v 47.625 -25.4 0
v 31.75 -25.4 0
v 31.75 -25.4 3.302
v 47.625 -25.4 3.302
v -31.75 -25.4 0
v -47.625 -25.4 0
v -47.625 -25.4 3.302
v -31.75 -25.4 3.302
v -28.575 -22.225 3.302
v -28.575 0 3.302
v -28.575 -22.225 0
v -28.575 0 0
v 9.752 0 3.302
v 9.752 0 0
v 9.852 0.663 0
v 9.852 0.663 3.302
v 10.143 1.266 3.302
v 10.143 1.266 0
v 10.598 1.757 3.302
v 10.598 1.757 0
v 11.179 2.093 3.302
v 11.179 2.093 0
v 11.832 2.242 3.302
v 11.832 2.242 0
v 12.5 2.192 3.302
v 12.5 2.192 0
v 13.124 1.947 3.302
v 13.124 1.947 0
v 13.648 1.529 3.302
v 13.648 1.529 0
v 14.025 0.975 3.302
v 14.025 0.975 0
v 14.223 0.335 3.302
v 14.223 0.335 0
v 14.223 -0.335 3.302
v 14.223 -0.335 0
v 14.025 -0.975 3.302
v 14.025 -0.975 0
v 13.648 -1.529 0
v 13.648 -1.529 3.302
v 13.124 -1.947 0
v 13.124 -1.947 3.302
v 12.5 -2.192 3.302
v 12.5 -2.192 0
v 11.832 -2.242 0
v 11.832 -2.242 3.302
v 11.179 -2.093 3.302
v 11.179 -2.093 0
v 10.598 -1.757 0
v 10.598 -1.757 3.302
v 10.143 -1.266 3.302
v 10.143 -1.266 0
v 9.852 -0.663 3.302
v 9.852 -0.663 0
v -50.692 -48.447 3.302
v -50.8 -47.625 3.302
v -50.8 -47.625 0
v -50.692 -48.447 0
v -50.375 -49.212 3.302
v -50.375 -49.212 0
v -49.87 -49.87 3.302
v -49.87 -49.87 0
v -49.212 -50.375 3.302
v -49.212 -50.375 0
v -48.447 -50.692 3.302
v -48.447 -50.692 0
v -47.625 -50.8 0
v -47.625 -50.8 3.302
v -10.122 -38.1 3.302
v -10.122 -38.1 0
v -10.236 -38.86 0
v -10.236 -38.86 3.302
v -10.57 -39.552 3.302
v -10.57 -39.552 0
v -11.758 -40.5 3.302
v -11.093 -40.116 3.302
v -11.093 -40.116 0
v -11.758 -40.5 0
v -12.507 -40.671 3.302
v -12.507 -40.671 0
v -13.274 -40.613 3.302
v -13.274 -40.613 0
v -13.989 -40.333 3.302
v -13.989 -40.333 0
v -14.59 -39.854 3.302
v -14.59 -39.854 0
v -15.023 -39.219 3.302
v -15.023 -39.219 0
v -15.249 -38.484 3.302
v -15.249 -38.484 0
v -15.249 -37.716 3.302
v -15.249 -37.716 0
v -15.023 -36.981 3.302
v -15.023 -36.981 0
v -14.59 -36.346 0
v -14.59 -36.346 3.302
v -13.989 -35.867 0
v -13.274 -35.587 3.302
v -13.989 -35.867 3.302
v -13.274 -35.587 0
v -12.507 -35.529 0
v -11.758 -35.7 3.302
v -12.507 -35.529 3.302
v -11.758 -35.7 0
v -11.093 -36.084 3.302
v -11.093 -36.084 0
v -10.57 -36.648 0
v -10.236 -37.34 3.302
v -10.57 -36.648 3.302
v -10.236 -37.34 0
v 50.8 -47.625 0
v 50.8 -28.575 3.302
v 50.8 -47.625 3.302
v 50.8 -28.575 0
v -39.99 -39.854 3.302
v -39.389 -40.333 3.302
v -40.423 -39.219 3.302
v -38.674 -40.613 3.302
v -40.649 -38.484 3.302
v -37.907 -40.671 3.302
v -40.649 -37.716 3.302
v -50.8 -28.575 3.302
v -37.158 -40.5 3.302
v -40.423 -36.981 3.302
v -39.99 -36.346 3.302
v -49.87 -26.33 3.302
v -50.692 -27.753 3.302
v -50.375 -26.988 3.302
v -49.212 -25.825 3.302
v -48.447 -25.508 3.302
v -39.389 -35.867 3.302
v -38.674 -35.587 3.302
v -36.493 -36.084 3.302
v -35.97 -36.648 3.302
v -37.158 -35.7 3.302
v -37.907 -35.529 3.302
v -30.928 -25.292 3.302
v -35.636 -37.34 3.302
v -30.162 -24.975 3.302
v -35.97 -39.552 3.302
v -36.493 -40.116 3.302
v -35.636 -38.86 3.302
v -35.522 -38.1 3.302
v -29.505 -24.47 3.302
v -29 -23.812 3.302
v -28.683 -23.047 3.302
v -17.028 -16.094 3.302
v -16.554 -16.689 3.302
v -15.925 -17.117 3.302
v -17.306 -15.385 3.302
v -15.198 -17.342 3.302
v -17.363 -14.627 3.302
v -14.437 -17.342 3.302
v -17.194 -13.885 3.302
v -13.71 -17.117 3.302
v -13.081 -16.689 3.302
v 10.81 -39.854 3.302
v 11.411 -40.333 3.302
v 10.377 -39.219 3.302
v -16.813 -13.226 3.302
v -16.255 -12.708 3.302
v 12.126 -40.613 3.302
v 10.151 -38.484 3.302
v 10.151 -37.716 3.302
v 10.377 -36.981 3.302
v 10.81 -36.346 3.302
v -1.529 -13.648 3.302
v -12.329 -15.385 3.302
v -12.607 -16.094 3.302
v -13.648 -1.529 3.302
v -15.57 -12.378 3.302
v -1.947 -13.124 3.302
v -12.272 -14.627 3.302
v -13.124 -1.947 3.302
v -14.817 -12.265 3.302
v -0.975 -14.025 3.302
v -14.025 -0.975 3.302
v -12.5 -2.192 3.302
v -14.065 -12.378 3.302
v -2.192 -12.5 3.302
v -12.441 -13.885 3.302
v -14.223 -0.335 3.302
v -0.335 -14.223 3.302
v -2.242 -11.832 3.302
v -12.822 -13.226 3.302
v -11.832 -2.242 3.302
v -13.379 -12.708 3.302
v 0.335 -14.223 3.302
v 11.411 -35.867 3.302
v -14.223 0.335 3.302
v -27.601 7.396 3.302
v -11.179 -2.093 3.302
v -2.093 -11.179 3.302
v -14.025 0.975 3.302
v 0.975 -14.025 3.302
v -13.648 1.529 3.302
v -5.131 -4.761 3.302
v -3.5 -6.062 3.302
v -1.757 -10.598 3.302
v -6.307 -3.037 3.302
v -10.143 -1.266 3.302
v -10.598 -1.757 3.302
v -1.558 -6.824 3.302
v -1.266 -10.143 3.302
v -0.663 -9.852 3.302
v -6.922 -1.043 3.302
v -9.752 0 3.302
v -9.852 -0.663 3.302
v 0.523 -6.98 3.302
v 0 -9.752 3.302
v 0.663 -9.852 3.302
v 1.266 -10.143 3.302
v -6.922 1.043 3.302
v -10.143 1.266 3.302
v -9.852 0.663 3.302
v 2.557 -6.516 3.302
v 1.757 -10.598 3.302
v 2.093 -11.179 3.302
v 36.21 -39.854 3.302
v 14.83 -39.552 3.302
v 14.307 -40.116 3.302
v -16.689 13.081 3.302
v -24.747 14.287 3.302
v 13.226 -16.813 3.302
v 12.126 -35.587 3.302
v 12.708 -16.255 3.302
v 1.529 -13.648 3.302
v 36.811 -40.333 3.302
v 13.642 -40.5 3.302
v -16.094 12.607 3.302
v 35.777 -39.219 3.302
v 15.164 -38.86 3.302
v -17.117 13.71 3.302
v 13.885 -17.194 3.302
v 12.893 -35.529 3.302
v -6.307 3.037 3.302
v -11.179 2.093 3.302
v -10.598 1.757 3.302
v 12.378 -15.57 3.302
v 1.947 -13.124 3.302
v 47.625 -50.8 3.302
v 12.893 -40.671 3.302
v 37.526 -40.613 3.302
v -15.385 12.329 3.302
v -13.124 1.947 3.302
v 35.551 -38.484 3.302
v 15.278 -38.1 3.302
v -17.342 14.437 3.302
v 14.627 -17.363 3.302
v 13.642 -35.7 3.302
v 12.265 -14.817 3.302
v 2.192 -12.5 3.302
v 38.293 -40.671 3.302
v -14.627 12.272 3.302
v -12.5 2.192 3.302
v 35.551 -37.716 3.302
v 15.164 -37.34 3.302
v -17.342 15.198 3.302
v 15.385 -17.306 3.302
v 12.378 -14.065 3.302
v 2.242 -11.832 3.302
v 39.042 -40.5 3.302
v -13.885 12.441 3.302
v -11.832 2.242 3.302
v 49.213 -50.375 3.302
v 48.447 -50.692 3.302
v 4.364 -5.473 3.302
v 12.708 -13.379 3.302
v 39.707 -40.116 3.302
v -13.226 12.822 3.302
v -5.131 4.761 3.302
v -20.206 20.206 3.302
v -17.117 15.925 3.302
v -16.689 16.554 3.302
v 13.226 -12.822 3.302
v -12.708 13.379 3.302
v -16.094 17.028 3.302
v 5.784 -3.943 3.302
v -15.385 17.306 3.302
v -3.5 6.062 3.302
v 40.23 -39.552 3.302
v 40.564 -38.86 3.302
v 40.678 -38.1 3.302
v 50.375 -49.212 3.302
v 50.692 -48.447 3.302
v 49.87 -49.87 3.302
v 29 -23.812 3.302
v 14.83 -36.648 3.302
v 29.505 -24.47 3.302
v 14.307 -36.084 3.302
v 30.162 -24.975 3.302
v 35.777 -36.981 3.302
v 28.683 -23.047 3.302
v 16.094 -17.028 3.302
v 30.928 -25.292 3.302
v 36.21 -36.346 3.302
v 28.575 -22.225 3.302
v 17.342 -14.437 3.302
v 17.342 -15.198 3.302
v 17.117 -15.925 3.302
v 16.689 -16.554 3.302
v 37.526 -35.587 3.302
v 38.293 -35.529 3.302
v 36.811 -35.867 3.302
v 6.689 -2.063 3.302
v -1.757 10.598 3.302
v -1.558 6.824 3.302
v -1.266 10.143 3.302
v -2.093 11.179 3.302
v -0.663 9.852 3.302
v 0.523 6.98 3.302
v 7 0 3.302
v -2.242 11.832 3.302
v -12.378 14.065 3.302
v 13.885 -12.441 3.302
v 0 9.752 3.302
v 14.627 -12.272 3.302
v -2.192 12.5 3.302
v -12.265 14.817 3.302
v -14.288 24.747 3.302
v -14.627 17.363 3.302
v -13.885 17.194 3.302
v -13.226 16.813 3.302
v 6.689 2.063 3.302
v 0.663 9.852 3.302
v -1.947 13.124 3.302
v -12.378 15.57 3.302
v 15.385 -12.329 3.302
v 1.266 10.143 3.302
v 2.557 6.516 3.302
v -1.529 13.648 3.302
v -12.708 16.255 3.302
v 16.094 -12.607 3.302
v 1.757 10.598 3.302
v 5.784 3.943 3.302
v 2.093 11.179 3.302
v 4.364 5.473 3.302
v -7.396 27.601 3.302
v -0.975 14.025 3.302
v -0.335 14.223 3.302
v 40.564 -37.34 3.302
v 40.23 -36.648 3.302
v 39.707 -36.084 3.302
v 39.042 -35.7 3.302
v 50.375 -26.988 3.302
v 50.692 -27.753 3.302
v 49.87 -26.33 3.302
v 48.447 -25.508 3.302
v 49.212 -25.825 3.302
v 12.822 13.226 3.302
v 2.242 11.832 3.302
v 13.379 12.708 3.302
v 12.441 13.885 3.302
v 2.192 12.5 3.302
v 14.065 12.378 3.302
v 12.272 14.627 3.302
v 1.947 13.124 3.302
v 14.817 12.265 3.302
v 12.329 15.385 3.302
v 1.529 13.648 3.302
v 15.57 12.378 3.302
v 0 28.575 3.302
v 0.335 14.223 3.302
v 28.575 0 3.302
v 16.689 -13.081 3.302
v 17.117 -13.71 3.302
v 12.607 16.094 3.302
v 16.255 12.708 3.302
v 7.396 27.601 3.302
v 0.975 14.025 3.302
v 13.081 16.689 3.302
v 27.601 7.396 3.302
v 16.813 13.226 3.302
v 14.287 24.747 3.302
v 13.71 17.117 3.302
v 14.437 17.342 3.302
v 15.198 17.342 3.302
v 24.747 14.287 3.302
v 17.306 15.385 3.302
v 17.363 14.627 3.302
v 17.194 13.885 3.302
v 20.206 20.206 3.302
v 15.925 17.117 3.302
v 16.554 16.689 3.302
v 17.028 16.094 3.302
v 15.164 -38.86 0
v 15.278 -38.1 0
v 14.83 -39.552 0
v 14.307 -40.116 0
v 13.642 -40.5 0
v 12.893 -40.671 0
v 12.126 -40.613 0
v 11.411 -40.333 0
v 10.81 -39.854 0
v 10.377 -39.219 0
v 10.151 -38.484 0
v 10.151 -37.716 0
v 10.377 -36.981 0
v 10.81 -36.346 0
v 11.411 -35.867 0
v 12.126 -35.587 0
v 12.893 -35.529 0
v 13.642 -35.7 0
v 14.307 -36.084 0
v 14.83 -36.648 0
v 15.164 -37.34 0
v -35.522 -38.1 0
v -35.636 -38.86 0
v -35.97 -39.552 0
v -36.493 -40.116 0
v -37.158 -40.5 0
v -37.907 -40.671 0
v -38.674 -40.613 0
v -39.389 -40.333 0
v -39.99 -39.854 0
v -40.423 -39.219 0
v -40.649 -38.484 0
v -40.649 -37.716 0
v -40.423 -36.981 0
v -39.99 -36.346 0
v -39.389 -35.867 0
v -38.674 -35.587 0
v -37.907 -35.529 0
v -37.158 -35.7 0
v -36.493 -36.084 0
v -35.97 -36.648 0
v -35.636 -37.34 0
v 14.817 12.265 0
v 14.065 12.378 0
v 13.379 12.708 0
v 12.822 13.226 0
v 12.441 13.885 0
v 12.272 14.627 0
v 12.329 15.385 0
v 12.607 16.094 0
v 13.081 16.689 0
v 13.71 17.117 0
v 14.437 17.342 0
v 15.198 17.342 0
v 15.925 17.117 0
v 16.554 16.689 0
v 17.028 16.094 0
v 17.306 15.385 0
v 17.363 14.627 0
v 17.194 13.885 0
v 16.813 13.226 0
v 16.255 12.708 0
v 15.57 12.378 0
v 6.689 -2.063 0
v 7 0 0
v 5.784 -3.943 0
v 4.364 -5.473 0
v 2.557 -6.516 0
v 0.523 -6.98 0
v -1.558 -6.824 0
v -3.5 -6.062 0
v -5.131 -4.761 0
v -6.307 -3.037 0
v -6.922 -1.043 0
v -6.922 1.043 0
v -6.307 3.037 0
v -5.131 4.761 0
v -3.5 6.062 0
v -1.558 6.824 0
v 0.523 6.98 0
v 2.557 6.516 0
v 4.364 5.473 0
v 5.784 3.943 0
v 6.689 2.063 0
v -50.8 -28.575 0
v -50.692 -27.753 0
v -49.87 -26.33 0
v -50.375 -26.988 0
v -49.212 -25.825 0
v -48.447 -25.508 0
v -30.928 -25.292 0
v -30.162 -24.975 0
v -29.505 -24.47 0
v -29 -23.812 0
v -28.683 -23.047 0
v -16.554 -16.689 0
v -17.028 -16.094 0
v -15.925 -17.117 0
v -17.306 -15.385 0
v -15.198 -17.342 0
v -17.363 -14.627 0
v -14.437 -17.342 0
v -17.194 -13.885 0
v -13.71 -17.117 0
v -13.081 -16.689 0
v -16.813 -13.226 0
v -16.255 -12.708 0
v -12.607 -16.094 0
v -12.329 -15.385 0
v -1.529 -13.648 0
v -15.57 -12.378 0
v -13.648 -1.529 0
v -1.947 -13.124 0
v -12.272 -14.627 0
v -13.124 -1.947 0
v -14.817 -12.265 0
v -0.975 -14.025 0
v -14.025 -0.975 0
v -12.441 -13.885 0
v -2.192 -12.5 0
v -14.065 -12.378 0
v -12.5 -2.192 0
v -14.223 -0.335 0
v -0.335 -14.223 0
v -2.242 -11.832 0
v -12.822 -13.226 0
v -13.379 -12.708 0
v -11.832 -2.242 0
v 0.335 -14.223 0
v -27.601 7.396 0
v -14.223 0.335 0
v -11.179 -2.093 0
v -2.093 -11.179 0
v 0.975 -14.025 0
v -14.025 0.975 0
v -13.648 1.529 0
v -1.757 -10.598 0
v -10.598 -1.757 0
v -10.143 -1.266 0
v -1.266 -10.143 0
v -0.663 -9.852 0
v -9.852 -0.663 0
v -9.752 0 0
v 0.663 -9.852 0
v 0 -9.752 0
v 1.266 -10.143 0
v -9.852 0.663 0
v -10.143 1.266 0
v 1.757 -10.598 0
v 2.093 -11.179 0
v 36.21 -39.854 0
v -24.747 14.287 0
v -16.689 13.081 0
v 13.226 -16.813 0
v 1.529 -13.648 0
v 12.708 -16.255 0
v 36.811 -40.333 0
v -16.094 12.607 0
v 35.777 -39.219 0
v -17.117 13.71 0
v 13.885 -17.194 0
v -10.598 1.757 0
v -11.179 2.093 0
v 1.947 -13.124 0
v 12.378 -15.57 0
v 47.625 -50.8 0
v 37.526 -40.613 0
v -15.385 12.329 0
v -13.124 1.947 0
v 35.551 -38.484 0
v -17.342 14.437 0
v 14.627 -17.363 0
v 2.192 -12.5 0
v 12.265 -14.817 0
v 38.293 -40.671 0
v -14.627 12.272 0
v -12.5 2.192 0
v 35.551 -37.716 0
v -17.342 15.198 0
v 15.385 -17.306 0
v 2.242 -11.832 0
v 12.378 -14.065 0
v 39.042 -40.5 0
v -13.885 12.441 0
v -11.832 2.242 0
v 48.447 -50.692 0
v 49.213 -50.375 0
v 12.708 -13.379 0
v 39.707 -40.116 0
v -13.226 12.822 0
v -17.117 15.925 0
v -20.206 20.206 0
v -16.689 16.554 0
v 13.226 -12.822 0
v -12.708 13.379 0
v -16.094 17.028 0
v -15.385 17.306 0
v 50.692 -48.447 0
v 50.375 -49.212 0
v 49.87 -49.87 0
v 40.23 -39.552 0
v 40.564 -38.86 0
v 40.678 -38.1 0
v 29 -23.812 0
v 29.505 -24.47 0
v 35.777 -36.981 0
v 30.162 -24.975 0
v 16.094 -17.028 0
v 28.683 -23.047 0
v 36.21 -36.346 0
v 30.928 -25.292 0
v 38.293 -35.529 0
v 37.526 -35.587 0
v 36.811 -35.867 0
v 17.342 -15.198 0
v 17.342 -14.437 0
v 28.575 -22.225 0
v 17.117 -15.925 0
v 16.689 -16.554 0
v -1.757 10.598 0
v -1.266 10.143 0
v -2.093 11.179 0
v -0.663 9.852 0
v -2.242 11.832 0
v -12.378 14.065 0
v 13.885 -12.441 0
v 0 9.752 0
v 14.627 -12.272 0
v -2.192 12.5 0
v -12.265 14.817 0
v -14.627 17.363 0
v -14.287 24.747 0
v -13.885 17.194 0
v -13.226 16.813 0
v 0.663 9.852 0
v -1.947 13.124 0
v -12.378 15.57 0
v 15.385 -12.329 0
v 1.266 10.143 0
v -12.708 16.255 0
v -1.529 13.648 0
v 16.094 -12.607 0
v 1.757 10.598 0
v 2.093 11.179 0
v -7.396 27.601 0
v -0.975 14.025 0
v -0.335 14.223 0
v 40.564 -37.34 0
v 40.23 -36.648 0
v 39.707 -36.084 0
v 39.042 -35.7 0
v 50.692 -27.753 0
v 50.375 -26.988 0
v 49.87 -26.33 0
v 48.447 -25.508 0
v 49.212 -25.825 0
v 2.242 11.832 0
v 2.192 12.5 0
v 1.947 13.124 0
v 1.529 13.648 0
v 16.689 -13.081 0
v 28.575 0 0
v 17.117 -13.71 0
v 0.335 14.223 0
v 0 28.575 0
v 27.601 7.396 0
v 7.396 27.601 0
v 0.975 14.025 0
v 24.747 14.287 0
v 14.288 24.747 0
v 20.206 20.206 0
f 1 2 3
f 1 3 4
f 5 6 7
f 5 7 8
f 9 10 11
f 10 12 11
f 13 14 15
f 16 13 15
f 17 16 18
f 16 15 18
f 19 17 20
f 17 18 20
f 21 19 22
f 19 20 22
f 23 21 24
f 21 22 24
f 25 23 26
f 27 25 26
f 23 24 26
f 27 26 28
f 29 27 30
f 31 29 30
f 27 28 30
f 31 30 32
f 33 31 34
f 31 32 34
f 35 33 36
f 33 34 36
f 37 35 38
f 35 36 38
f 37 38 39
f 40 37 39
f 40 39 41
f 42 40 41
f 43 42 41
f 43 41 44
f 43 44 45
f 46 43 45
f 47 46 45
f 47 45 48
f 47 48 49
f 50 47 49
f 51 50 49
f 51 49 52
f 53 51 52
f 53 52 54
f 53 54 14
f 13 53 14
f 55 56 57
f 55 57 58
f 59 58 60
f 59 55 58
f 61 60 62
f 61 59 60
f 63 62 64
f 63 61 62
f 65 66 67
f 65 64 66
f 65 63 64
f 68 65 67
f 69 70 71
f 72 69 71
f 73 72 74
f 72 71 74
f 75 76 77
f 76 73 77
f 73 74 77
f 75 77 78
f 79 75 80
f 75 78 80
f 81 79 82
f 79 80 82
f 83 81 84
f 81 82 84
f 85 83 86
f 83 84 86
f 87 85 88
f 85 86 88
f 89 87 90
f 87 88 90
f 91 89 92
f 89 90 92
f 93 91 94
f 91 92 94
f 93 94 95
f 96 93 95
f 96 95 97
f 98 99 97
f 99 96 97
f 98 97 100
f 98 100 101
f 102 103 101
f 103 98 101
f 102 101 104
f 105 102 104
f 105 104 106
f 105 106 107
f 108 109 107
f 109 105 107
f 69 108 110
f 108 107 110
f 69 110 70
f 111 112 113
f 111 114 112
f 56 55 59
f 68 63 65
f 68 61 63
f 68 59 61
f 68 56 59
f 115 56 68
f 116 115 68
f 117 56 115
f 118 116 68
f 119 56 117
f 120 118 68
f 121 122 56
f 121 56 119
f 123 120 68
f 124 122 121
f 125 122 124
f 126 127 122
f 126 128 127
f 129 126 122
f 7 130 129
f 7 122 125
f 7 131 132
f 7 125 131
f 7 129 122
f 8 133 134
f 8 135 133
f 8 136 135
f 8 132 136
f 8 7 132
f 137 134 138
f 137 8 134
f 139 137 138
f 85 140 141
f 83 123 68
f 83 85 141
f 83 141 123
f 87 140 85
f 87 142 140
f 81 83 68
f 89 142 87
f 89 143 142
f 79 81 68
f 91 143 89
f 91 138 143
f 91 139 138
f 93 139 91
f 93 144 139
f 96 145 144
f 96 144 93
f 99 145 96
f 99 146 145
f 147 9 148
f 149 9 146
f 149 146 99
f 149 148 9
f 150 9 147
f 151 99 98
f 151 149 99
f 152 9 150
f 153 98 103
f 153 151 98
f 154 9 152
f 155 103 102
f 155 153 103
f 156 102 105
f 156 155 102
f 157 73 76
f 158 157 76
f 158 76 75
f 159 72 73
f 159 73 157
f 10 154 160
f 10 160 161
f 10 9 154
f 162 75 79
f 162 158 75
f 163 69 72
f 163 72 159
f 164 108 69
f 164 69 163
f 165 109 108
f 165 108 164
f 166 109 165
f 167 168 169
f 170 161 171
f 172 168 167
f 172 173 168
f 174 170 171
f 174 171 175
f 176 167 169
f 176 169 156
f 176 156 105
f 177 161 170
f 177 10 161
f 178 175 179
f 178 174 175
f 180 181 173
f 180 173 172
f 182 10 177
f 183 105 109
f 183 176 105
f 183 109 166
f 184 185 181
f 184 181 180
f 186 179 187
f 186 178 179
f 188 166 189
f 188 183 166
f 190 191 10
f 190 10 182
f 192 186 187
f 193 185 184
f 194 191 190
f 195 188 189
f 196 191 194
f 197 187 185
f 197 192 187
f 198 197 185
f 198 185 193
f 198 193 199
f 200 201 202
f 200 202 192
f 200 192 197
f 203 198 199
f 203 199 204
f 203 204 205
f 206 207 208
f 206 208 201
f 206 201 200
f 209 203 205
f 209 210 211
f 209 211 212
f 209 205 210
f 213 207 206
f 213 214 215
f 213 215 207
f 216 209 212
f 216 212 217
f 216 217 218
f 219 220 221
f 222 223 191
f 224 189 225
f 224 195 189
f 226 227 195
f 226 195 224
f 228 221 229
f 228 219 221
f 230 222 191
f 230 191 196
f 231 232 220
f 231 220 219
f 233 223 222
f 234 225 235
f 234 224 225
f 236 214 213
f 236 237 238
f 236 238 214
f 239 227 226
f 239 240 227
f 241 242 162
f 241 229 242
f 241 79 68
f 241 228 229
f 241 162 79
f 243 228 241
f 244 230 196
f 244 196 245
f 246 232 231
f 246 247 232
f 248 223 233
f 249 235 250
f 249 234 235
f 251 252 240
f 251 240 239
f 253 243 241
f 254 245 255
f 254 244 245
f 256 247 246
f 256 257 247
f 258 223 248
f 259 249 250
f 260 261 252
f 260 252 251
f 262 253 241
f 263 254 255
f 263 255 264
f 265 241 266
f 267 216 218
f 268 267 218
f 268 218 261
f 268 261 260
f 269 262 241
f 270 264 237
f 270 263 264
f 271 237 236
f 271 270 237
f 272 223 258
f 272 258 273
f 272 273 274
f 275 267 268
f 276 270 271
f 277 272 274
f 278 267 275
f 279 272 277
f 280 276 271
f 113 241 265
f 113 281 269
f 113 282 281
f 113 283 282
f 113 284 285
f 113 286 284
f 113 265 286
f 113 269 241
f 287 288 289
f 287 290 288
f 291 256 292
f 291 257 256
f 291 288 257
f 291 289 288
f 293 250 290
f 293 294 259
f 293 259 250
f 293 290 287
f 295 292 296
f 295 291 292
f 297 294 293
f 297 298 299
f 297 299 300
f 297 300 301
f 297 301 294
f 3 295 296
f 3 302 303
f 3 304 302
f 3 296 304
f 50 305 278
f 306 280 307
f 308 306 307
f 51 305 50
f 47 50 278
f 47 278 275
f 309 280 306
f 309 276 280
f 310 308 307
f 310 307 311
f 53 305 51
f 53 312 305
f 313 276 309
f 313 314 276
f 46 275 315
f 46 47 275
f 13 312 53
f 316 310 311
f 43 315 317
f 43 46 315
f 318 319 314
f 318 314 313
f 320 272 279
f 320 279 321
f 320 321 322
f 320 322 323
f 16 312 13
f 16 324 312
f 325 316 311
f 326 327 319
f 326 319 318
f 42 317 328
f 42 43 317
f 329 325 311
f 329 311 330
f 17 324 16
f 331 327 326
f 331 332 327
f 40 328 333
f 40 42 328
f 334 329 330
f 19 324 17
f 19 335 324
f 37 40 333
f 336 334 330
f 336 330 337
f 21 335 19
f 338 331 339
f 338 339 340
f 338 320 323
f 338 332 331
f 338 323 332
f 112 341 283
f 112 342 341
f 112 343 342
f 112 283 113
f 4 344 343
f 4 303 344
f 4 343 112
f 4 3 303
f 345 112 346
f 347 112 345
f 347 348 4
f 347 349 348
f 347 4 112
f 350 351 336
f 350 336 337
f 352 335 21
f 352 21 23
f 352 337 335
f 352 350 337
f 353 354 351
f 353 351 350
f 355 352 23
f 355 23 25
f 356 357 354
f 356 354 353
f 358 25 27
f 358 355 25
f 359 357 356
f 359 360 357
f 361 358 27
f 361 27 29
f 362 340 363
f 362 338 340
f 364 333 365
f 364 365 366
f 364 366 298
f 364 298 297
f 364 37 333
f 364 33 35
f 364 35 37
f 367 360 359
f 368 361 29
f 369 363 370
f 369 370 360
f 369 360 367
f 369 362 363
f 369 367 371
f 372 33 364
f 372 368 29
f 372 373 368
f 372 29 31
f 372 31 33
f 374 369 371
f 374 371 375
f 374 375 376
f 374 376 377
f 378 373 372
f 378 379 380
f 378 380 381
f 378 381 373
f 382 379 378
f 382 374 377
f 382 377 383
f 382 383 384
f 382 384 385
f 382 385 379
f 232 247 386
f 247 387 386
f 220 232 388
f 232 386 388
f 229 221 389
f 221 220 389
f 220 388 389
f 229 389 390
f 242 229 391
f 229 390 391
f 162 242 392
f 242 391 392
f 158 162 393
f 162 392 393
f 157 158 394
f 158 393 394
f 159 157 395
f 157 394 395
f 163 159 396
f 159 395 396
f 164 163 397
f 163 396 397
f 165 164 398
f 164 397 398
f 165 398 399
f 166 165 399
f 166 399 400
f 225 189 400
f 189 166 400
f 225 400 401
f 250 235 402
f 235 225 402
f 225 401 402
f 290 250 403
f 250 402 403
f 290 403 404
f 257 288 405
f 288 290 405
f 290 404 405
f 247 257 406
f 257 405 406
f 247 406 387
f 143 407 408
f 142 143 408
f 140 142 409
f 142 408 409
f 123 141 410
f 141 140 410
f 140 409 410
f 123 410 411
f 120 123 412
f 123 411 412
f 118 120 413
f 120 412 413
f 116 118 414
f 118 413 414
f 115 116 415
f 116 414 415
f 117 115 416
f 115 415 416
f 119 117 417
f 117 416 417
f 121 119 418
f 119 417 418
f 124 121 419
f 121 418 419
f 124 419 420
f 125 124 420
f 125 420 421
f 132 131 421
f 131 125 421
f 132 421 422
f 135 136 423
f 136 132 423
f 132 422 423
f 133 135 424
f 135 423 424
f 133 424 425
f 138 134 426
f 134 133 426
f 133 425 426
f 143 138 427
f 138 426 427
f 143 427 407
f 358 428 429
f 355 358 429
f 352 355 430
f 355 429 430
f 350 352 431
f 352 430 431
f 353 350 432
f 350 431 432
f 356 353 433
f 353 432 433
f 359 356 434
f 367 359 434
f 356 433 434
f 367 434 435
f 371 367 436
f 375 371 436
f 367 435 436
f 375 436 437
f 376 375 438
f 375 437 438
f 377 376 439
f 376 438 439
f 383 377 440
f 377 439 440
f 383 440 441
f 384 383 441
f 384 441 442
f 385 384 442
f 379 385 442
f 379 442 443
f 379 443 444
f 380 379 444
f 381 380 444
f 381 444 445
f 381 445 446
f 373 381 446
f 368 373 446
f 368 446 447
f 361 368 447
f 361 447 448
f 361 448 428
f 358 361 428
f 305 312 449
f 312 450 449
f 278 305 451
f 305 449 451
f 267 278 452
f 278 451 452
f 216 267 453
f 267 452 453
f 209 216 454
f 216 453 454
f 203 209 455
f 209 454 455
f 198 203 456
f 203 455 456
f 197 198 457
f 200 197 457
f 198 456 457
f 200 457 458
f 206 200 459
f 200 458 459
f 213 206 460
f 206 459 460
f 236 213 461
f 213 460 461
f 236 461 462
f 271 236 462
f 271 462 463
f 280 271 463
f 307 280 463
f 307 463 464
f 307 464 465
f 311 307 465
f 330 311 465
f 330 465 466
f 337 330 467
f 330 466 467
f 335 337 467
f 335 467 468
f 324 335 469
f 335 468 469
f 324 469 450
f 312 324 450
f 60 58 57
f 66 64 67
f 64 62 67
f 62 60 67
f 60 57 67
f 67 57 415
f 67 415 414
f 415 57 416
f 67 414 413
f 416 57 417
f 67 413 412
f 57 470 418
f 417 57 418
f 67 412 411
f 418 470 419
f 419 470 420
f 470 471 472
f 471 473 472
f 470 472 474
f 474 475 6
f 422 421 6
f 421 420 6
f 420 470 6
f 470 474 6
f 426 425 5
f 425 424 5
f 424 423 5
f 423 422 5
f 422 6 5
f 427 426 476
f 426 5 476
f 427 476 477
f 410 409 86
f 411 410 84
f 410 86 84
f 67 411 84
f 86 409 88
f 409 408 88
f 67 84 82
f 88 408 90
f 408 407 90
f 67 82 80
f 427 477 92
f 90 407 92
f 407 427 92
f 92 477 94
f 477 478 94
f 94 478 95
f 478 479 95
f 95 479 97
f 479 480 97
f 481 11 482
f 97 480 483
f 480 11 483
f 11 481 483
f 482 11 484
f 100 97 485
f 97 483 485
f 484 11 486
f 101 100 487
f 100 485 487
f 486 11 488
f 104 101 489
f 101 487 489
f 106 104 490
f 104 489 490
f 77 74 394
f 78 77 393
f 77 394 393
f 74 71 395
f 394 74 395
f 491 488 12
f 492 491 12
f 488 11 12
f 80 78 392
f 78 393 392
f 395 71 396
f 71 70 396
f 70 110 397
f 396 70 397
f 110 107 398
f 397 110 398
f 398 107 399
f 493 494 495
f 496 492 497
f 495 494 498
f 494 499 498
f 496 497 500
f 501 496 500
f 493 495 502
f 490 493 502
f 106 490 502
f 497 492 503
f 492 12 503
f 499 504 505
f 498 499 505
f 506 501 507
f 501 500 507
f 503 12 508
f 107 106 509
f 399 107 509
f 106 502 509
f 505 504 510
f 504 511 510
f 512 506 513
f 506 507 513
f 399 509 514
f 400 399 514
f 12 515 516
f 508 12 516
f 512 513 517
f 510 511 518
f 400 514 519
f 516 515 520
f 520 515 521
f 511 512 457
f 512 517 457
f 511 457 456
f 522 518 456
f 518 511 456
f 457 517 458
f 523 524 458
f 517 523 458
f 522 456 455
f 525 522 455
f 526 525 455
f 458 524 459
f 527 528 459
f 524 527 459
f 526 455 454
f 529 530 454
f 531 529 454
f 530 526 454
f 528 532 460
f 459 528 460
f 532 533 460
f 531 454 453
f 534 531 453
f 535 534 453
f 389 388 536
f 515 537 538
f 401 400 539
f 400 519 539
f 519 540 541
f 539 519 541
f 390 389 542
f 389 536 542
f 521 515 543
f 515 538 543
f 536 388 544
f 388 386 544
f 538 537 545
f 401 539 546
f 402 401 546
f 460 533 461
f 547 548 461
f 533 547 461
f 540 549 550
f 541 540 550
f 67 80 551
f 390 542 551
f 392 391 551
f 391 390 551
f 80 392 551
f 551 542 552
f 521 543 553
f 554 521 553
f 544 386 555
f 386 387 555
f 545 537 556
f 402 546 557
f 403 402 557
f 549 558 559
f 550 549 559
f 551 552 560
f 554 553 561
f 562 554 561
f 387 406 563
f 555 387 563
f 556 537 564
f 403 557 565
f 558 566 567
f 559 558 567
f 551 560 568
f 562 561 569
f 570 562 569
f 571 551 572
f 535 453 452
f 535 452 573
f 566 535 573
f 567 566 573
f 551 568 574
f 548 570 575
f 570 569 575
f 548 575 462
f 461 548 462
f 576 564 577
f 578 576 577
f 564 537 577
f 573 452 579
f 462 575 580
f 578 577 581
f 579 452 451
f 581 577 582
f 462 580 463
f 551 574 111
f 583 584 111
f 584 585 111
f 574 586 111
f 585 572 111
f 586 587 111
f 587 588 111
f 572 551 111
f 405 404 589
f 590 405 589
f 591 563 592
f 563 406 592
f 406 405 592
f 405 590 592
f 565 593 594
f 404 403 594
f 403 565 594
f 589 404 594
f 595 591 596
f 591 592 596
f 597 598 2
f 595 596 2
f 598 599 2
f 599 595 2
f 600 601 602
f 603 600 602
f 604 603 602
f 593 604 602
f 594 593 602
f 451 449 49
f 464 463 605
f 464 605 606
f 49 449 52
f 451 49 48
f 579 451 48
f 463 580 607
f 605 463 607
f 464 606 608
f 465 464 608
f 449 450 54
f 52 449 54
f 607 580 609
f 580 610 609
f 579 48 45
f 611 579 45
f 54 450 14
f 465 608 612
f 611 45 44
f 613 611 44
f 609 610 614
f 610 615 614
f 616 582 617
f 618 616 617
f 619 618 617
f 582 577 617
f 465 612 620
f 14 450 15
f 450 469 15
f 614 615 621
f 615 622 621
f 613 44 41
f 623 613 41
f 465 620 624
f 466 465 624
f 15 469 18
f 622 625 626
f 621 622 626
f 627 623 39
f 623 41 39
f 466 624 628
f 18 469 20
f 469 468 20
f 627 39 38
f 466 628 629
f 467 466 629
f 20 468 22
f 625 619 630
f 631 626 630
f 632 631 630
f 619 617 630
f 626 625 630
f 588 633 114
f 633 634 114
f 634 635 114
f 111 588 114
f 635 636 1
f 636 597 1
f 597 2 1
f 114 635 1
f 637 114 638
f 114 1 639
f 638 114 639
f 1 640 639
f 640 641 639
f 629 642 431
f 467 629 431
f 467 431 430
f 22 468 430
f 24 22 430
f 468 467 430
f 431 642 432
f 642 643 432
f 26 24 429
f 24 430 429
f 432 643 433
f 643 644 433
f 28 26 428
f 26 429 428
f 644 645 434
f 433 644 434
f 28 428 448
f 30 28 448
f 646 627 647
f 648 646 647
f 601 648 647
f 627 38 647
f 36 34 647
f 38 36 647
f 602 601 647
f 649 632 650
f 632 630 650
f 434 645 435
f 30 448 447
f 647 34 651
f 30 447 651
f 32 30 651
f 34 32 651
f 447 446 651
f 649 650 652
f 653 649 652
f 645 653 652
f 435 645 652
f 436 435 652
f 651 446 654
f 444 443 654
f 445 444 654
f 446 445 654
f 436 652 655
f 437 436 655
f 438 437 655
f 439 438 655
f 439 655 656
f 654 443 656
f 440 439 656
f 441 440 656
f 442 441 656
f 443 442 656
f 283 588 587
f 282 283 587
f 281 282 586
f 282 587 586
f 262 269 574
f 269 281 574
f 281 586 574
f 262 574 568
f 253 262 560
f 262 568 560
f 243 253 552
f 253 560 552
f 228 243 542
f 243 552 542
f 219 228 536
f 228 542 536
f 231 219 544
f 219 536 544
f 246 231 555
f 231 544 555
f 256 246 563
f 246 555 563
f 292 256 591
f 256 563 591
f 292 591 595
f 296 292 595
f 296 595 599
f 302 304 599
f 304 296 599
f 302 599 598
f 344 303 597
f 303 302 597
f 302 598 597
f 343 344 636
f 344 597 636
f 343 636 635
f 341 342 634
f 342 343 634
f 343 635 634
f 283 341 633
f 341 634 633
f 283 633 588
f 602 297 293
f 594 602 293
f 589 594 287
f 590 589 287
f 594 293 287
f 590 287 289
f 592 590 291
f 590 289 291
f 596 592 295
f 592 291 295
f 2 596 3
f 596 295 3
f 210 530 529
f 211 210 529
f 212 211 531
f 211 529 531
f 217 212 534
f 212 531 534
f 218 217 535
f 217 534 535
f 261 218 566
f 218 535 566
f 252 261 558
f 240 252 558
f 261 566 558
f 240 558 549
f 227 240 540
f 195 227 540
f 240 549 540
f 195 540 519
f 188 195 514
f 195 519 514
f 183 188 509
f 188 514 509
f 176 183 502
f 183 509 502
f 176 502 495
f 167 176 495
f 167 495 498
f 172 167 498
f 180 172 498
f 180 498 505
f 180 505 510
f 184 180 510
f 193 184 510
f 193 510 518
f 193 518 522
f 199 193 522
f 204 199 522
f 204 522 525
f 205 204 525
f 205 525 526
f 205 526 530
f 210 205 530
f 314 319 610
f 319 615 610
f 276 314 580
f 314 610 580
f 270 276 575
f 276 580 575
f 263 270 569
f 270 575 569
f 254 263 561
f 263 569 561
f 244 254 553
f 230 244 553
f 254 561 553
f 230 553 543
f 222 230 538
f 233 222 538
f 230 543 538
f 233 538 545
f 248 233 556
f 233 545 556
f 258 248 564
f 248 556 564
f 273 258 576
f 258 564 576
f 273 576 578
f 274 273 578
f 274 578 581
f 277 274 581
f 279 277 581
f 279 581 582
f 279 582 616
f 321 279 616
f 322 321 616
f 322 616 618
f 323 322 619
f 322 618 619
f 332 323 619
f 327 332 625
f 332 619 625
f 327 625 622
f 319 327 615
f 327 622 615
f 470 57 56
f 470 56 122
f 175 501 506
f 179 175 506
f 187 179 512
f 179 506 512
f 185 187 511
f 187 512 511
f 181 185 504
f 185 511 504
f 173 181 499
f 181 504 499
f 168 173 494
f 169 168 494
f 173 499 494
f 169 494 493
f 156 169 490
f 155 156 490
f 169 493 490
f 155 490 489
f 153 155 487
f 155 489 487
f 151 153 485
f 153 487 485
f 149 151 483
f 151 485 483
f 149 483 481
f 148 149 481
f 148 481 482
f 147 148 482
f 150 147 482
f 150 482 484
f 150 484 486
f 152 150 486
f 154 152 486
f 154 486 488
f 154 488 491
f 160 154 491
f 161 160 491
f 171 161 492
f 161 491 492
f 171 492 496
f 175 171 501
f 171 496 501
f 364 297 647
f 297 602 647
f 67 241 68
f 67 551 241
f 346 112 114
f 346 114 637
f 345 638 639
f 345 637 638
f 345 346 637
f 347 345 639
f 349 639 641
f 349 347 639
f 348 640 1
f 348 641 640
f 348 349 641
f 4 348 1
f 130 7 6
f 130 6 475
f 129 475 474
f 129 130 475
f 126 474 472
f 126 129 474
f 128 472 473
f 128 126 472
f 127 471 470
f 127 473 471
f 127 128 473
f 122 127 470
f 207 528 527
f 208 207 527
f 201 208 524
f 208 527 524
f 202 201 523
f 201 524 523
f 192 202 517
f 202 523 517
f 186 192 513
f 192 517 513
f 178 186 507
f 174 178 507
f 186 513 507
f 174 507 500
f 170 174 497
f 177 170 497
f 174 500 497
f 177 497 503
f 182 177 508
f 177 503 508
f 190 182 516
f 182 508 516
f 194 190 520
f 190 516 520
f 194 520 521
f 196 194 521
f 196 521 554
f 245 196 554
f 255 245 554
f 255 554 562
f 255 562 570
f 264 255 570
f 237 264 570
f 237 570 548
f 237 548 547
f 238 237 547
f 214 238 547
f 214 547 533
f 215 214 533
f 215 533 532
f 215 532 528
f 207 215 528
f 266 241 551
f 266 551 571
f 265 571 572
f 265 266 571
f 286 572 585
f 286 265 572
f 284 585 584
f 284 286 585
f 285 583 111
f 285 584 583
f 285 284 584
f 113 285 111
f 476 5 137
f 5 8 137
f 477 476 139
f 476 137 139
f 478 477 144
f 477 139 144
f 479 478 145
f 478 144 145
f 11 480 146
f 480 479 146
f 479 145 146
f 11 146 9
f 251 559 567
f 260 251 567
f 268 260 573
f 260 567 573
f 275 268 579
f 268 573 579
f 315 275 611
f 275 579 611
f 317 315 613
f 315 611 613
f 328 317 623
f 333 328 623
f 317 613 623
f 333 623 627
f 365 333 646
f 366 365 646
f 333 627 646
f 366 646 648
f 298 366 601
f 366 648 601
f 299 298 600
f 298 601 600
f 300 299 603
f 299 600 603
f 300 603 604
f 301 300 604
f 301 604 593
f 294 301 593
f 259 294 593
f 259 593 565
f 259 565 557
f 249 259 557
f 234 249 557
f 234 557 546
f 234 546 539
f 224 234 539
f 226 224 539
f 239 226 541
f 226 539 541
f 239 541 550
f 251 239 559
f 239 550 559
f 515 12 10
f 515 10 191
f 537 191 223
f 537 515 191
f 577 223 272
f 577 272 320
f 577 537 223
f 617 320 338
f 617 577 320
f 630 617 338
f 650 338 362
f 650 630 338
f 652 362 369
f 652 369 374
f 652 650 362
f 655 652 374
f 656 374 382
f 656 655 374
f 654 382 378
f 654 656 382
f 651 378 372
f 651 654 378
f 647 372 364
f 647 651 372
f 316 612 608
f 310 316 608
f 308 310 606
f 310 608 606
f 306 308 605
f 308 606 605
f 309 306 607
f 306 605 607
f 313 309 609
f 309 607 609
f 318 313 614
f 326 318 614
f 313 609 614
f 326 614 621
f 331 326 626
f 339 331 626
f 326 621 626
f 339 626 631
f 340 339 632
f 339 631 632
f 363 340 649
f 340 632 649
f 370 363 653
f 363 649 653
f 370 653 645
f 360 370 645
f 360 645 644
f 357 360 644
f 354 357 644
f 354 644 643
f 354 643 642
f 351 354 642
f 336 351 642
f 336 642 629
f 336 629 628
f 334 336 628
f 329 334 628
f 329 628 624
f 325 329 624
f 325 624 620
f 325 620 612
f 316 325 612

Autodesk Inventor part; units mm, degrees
ref_plane "YZ Plane" through (0, 0, 0) normal (1, 0, 0) x (0, 1, 0)
ref_plane "XZ Plane" through (0, 0, 0) normal (0, 1, 0) x (-1, 0, 0)
ref_plane "XY Plane" through (0, 0, 0) normal (0, 0, 1) x (1, 0, 0)
sketch "Sketch1" plane through (0, 0, 0) normal (0, 0, 1) x (1, 0, 0)
  arc A0 (28.575, 0) -> (-28.575, 0) centre (0, 0) ccw
  circle A1 centre (0, 0) radius 7
  line L0 (-19, -50.8) -> (19, -50.8)
  line L1 (28.575, -25.4) -> (28.575, 0)
  line L2 (-28.575, 0) -> (-28.575, -25.4)
  line L3 (0, -66.675) -> (0, 44.45) projected
  circle A2 centre (-12.7, -38.1) radius 2.5781
  circle A3 centre (12.7, -38.1) radius 2.5781
  line L4 (-19, -50.8) -> (-50.8, -50.8)
  line L5 (-50.8, -50.8) -> (-50.8, -25.4)
  line L6 (50.8, -25.4) -> (50.8, -50.8)
  line L7 (50.8, -50.8) -> (-50.8, -50.8)
  line L8 (-50.8, -25.4) -> (-28.575, -25.4)
  line L9 (28.575, -25.4) -> (50.8, -25.4)
  circle A4 centre (-38.1, -38.1) radius 2.5781
  circle A5 centre (38.1, -38.1) radius 2.5781
  dimension "d1" = 14
  dimension "d10" = 5.1562
  dimension "d11" = 5.1562
  dimension "d12" = 12.7
  dimension "d13" = 12.7
  dimension "d14" = 12.7
  dimension "d15" = 12.7
  dimension "d16" = 50.8
  dimension "d17" = 25.4
  dimension "d18" = 101.6
  dimension "d19" = 50.8
  dimension "d20" = 25.4
  dimension "d21" = 25.4
  dimension "d25" = 28.575
  dimension "d26" = 25.4
extrude "Extrusion1" add sketch "Sketch1" along normal blind 3.302 contours L1 L9 L6 L7 L0 L3 A1 A0 | L3 A1 L0 L4 L5 L8 L2 A0
fillet "Fillet1" radius 3.175 6 edges at (28.575, -25.4, 1.651) (-28.575, -25.4, 1.651) (-50.8, -25.4, 1.651) (-50.8, -50.8, 1.651) (50.8, -25.4, 1.651) (50.8, -50.8, 1.651)
sketch "Sketch2" plane through (0, 0, 3.302) normal (0, 0, 1) x (1, 0, 0)
  circle A0 centre (0, 0) radius 12
  circle A1 centre (0, 0) radius 20.955
  circle A2 centre (0, 0) radius 7 projected
  line L0 (0, 0) -> (14.8174, 14.8174)
  line L1 (0, 0) -> (12, 0) construction
  line L2 (0, 0) -> (0, 12) construction
  dimension "d28" = 41.91
  dimension "d27" = 24
  dimension "d29" = 45
hole "Hole1" at (14.8174, 14.8174, 3.302) direction (0, 0, -1) diameter 5.1054 depth 16.256 tip angle 118 clearance for "Flat Head Machine Screw (82)" size "#10" standard "Ansi Unified Screw Threads"
pattern_circular "Circular Pattern1" count 4 over 360 about axis through (0, 0, 0) along (0, 0, 1) of "Hole1"
hole "Hole2" at (0, 12, 3.302) direction (0, 0, -1) diameter 4.4958 depth 16.256 tip angle 118 clearance for "Flat Head Machine Screw" size "M4" standard "Ansi Metric M Profile"
pattern_circular "Circular Pattern2" count 4 over 360 about axis through (0, 0, 0) along (0, 0, 1) of "Hole2"
equation "\"d19\" = 0.5 * d18"
properties part number "ArmPlateBase V2"
